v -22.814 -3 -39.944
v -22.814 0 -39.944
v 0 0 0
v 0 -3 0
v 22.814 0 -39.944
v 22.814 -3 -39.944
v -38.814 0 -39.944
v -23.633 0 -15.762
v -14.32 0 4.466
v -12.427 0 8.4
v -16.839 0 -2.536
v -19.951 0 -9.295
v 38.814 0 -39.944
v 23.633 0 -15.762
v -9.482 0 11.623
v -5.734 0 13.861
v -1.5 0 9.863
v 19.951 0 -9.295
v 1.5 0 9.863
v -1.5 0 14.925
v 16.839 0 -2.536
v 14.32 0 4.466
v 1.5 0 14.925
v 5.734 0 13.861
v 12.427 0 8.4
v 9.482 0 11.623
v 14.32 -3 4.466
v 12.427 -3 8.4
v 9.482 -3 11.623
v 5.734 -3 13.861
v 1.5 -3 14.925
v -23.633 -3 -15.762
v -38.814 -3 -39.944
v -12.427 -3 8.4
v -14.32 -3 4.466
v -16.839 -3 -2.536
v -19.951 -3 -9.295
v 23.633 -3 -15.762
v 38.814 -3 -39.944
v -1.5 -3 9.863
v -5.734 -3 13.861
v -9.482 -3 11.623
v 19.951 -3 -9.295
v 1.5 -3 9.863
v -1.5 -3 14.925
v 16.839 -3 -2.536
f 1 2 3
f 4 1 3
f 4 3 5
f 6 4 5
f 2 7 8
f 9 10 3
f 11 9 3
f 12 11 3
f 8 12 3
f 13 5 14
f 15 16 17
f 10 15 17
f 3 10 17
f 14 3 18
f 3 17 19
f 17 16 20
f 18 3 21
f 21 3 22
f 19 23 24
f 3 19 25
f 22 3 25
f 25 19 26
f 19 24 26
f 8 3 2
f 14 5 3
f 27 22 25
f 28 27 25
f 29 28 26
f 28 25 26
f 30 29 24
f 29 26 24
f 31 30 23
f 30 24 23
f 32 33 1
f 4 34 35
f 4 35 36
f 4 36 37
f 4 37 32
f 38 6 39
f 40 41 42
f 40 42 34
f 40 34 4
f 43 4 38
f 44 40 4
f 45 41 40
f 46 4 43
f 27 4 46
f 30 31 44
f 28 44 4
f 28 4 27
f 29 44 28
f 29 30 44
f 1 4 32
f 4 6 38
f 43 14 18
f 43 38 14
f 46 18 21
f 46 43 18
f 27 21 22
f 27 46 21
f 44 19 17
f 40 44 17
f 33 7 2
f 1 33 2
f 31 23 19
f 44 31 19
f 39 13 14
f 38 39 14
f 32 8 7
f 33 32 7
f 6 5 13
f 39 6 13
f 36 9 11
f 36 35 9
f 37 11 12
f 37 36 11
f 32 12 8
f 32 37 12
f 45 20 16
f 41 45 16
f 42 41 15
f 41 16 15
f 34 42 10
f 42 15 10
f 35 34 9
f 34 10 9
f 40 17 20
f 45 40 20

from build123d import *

# Parameters (mm, degrees)
F1_DEPTH = 3
F2_R     = 86.474074


with BuildPart() as f1:
    # F0 (on Front) → F1 (new body)
    with BuildSketch(Plane.XZ):
        with BuildLine():
            Line((38.813758, -39.944117), (14.887724, -1.831849))
            ThreePointArc((14.887724, -1.831849), (11.719036, 9.362916), (1.5, 14.924812))
            Line((1.5, 14.924812), (1.5, 9.863055))
            Line((1.5, 9.863055), (-1.5, 9.863055))
            Line((-1.5, 9.863055), (-1.5, 14.924812))
            ThreePointArc((-1.5, 14.924812), (-11.719036, 9.362916), (-14.887724, -1.831849))
            Line((-14.887724, -1.831849), (-38.813758, -39.944117))
            Line((-38.813758, -39.944117), (-22.813758, -39.944117))
            Line((-22.813758, -39.944117), (0, 0))
            Line((0, 0), (22.813758, -39.944117))
            Line((22.813758, -39.944117), (38.813758, -39.944117))
        make_face()
    extrude(amount=F1_DEPTH)

    # F2
    f2_edges = [f1.edges().sort_by_distance(p)[0] for p in [
        (14.887724, -1.5, -1.831849),
        (-14.887724, -1.5, -1.831849),
    ]]
    fillet(f2_edges, radius=F2_R)


solid = f1.part
